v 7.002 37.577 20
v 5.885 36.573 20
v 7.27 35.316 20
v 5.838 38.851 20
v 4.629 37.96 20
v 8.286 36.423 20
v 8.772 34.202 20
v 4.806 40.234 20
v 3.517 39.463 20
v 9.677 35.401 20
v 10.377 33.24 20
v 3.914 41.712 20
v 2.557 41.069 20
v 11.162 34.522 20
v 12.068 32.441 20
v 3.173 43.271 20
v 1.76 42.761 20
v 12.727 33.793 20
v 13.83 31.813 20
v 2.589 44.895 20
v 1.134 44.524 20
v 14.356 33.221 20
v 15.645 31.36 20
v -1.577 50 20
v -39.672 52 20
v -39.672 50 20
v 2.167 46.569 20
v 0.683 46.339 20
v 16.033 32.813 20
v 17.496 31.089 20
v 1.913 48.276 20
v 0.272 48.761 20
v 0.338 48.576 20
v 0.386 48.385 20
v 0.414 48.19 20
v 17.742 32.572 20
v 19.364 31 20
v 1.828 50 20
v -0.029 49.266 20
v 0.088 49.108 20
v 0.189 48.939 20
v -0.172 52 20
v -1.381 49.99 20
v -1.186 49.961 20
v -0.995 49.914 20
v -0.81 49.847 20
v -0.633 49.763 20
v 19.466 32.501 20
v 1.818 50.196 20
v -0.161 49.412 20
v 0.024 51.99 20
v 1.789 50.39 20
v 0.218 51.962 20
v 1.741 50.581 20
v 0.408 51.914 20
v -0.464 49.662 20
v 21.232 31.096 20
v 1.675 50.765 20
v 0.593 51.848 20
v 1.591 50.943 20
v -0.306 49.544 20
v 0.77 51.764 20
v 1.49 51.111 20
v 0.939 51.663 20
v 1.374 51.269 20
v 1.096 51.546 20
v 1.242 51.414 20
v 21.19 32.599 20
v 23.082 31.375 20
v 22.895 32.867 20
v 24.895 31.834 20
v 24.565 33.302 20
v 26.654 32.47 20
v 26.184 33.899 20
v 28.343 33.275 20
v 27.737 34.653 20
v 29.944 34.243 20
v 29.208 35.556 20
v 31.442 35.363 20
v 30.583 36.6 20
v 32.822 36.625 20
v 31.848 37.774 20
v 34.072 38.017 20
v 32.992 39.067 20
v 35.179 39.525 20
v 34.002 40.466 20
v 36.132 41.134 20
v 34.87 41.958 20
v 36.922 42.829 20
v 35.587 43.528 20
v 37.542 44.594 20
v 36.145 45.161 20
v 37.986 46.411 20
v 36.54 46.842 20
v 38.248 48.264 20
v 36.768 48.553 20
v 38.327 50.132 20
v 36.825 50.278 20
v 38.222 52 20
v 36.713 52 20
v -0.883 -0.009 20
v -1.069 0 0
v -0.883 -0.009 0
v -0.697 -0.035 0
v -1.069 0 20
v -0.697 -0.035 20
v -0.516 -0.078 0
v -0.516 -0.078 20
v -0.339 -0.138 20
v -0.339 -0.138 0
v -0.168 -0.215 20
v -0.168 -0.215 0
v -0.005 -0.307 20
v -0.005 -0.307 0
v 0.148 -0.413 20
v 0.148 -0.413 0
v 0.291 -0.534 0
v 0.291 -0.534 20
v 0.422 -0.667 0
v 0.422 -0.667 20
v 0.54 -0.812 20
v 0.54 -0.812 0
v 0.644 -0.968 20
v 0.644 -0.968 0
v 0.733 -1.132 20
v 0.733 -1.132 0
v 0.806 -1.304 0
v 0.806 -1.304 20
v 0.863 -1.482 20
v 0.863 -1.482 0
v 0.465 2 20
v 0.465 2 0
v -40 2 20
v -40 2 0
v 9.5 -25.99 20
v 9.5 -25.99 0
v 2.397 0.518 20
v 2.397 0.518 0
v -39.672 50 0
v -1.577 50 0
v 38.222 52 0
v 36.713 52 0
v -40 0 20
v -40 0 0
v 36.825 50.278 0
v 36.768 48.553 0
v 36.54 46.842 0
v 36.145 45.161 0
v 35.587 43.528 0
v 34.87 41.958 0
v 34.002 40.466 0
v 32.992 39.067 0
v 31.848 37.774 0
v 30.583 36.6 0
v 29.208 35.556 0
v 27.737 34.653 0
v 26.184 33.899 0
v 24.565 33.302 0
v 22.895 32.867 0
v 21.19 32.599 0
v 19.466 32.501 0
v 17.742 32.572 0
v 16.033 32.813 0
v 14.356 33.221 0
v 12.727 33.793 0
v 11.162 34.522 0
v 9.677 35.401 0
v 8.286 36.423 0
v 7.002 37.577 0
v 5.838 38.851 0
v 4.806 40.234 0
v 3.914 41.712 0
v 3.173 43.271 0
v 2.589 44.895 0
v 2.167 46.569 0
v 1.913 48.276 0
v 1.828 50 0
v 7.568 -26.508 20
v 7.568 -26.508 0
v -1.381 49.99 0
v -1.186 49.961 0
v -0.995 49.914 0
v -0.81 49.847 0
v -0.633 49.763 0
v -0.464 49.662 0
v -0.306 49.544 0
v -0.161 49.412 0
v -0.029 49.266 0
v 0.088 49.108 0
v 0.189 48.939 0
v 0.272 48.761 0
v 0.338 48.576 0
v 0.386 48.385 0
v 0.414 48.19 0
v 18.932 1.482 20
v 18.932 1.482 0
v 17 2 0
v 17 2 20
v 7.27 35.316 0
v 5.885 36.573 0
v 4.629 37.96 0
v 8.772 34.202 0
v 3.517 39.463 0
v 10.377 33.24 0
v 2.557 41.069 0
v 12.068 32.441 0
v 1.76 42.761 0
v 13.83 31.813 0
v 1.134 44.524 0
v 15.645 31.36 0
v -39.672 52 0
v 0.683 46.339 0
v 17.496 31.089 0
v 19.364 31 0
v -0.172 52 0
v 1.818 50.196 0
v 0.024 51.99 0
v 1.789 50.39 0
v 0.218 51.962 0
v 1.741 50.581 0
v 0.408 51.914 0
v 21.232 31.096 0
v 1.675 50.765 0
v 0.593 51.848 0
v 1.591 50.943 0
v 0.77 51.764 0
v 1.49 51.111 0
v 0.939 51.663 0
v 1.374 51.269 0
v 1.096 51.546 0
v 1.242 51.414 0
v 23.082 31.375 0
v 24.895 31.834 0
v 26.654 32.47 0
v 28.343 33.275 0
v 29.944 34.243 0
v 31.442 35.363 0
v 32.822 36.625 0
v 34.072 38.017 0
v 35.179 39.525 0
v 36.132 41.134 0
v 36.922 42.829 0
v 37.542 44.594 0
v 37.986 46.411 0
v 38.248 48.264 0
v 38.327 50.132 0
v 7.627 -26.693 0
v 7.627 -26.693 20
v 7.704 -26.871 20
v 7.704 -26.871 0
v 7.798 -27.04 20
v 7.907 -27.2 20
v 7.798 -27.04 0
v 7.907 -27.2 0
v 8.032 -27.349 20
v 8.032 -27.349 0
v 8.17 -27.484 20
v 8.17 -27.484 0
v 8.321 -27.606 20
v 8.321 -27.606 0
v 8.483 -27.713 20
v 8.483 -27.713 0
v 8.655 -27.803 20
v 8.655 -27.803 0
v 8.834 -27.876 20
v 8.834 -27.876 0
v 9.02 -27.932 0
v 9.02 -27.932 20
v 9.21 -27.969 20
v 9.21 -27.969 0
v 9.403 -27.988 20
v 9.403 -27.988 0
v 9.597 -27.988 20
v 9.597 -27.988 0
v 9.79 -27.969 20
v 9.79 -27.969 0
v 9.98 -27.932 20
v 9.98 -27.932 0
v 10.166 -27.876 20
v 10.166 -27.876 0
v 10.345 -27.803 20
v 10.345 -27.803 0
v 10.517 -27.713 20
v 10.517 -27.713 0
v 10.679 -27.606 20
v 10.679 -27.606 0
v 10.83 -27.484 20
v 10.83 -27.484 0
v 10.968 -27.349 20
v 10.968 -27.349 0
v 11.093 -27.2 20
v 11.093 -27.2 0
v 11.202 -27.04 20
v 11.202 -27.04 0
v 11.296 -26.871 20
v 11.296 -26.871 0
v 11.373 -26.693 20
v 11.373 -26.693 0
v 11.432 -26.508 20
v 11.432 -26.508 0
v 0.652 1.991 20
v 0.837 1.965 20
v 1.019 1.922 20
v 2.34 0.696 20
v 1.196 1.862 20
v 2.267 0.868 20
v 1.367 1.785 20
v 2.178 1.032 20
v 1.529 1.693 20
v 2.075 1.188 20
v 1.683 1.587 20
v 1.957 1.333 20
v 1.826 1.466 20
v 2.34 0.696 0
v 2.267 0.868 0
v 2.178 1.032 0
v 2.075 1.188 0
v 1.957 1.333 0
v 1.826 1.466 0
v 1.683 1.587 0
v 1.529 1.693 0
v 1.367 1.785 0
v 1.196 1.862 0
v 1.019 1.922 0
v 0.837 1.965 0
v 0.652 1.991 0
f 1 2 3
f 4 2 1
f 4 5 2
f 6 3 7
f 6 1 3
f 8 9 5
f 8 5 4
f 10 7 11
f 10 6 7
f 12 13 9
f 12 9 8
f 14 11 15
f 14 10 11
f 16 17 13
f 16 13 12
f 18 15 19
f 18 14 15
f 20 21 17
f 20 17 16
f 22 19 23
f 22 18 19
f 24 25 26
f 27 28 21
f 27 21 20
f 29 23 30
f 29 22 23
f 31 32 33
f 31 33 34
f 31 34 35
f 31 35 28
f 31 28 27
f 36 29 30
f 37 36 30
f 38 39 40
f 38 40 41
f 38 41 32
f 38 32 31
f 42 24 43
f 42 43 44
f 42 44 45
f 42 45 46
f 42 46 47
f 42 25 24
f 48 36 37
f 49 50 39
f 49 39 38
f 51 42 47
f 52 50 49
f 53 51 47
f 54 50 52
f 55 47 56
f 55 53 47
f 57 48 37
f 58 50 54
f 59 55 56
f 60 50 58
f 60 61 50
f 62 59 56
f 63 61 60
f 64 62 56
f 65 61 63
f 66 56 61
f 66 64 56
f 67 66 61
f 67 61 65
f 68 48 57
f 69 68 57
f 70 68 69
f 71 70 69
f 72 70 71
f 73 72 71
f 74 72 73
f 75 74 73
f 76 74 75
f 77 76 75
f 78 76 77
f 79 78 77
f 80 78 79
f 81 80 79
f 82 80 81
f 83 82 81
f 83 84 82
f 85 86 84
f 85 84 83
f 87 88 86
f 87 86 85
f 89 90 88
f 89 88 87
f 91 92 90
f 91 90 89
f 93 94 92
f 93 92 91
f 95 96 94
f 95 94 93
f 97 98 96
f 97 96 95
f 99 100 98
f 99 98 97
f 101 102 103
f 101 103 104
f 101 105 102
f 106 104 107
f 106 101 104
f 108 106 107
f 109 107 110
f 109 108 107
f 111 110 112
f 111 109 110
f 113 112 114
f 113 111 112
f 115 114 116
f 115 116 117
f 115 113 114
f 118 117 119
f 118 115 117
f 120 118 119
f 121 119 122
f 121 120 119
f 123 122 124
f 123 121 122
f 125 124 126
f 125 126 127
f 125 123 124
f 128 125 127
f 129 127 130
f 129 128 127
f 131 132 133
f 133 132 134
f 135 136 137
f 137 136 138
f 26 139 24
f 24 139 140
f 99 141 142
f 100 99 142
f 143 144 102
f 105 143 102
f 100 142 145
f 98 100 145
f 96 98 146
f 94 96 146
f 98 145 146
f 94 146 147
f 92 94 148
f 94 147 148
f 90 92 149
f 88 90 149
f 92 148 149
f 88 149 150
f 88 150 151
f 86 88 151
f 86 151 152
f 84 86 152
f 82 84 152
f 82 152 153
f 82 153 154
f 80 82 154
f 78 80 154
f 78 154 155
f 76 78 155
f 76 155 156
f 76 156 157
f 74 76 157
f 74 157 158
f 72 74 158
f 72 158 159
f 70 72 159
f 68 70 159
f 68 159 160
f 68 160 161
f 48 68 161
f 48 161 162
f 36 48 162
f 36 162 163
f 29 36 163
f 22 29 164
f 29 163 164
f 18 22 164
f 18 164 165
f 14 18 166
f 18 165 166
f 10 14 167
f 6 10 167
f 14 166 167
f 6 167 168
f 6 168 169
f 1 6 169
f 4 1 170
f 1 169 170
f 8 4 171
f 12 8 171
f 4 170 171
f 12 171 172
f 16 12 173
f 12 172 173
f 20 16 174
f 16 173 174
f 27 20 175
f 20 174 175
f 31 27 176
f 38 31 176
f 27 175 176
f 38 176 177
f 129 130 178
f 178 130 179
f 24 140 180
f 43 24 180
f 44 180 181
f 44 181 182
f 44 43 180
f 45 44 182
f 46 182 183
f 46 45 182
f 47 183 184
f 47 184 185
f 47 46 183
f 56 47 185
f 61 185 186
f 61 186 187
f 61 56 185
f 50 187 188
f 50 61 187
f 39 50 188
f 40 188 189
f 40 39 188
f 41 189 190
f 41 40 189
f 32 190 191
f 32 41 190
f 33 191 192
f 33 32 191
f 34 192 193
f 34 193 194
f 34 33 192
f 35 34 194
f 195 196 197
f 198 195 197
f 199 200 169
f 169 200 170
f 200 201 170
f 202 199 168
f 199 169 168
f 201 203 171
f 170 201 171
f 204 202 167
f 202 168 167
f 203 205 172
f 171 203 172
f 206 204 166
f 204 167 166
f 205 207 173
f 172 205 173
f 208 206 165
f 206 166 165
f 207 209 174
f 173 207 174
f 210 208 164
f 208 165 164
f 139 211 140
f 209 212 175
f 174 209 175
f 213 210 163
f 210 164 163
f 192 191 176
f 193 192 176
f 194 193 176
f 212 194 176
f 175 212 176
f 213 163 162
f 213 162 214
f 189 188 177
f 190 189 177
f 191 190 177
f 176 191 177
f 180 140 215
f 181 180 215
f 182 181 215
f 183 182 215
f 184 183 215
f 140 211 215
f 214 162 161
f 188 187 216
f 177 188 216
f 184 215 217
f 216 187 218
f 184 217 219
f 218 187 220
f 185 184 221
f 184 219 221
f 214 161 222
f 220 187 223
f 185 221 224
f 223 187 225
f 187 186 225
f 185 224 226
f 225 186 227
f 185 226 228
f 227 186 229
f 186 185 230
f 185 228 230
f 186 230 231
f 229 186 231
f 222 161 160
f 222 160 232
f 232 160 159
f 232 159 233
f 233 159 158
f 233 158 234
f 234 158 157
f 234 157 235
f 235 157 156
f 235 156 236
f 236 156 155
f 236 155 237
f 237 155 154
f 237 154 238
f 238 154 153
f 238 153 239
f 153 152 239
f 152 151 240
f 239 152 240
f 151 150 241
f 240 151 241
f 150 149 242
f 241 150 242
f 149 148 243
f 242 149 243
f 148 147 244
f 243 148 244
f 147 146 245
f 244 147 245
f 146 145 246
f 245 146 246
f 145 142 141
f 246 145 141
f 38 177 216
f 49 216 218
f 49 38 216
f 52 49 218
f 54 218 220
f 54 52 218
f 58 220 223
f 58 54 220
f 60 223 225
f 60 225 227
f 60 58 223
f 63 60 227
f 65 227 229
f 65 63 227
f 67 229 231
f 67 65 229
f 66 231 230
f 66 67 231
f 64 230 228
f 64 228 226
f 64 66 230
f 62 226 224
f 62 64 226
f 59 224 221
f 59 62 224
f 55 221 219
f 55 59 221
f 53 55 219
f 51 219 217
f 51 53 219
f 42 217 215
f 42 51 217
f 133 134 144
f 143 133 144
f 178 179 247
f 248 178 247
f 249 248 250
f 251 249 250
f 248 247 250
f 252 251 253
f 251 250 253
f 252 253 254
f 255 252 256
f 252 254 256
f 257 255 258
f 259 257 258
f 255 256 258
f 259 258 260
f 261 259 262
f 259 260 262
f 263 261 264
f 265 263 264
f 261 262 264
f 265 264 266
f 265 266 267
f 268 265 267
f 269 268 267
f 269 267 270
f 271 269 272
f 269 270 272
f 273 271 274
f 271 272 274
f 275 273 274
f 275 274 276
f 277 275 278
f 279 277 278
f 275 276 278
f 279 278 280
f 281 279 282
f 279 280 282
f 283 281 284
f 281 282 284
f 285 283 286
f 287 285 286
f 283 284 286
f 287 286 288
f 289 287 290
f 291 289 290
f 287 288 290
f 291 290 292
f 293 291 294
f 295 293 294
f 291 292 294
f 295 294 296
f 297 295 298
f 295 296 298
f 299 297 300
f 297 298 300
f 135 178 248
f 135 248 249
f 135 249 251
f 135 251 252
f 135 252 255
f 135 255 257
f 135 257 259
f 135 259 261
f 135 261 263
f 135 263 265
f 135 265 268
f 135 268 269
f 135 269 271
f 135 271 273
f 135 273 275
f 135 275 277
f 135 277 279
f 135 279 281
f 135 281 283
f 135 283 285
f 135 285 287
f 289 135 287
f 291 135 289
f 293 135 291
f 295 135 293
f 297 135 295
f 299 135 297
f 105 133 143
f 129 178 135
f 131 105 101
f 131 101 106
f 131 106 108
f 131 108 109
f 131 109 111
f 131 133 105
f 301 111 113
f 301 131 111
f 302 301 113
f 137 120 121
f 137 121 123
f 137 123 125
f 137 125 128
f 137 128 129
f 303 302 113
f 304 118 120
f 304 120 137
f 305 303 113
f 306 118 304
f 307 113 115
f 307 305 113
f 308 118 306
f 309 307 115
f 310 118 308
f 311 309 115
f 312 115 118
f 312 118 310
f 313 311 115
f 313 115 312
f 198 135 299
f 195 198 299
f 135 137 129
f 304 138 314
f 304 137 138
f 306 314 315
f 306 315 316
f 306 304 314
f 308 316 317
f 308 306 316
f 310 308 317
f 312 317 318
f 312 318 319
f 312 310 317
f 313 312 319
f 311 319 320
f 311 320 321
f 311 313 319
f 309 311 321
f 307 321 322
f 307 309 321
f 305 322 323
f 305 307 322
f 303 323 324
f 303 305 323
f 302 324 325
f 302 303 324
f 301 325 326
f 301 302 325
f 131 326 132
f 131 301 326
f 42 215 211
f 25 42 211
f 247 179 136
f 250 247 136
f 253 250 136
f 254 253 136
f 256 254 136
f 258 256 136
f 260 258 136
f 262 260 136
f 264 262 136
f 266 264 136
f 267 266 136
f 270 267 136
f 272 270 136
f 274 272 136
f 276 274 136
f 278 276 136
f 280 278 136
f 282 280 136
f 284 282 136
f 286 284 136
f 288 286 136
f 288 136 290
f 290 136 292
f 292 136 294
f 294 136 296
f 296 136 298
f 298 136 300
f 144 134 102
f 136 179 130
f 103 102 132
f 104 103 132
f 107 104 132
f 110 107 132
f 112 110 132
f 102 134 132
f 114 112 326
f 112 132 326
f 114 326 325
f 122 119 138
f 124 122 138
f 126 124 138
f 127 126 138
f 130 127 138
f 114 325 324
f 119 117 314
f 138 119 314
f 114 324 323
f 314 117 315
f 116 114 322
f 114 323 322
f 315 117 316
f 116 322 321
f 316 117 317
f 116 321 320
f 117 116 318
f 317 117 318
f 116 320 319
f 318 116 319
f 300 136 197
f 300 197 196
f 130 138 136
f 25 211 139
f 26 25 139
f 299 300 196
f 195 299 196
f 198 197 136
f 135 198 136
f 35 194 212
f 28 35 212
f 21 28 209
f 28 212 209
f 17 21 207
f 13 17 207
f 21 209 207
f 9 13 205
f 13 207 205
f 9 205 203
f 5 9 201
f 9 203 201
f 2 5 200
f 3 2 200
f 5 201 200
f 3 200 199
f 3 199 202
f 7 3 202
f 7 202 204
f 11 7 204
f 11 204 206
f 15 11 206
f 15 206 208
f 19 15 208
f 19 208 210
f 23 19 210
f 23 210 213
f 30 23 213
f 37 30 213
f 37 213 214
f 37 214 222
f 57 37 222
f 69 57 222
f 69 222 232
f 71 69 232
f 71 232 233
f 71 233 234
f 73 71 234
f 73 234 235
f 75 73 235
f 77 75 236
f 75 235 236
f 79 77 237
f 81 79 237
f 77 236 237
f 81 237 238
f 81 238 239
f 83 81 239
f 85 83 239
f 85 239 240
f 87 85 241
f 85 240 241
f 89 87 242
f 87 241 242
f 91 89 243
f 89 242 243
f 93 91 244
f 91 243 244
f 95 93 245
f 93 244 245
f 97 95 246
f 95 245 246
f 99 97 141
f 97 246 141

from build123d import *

# Parameters (mm, degrees)
F1_DEPTH = 20
F3_DEPTH = 20
F4_R     = 2
F4_2_R   = 2


with BuildPart() as f1:
    # F0 (on Top) → F1 (new body)
    with BuildSketch(Plane.XY):
        with BuildLine():
            Line((-40, 0), (0, 0))
            Line((0, 0), (0.465346, 0))
            Line((0.465346, 0), (7.568148, -26.508019))
            ThreePointArc((7.568148, -26.508019), (9.5, -27.990381), (11.431852, -26.508019))
            Line((11.431852, -26.508019), (18.931852, 1.482362))
            Line((18.931852, 1.482362), (17, 2))
            Line((17, 2), (9.5, -25.990381))
            Line((9.5, -25.990381), (2, 2))
            Line((2, 2), (-40, 2))
            Line((-40, 2), (-40, 0))
        make_face()
    extrude(amount=F1_DEPTH)

    # F4#2
    f4_2_edges = [f1.edges().sort_by_distance(p)[0] for p in [
        (2, 2, 10),
        (0.465346, 0, 10),
    ]]
    fillet(f4_2_edges, radius=F4_2_R)


with BuildPart() as f3:
    # F2 (on Top) → F3 (new body)
    with BuildSketch(Plane.XY):
        with BuildLine():
            Line((-39.672473, 50), (0.327527, 50))
            ThreePointArc((0.327527, 50), (20.328919, 31.026407), (38.221971, 52))
            Line((38.221971, 52), (36.712866, 52))
            ThreePointArc((36.712866, 52), (19.327527, 32.5), (1.942189, 52))
            Line((1.942189, 52), (-39.672473, 52))
            Line((-39.672473, 52), (-39.672473, 50))
        make_face()
    extrude(amount=F3_DEPTH)

    # F4
    f4_edges = [f3.edges().sort_by_distance(p)[0] for p in [
        (1.942189, 52, 10),
        (0.327527, 50, 10),
    ]]
    fillet(f4_edges, radius=F4_R)


solid = Compound([f1.part, f3.part])
